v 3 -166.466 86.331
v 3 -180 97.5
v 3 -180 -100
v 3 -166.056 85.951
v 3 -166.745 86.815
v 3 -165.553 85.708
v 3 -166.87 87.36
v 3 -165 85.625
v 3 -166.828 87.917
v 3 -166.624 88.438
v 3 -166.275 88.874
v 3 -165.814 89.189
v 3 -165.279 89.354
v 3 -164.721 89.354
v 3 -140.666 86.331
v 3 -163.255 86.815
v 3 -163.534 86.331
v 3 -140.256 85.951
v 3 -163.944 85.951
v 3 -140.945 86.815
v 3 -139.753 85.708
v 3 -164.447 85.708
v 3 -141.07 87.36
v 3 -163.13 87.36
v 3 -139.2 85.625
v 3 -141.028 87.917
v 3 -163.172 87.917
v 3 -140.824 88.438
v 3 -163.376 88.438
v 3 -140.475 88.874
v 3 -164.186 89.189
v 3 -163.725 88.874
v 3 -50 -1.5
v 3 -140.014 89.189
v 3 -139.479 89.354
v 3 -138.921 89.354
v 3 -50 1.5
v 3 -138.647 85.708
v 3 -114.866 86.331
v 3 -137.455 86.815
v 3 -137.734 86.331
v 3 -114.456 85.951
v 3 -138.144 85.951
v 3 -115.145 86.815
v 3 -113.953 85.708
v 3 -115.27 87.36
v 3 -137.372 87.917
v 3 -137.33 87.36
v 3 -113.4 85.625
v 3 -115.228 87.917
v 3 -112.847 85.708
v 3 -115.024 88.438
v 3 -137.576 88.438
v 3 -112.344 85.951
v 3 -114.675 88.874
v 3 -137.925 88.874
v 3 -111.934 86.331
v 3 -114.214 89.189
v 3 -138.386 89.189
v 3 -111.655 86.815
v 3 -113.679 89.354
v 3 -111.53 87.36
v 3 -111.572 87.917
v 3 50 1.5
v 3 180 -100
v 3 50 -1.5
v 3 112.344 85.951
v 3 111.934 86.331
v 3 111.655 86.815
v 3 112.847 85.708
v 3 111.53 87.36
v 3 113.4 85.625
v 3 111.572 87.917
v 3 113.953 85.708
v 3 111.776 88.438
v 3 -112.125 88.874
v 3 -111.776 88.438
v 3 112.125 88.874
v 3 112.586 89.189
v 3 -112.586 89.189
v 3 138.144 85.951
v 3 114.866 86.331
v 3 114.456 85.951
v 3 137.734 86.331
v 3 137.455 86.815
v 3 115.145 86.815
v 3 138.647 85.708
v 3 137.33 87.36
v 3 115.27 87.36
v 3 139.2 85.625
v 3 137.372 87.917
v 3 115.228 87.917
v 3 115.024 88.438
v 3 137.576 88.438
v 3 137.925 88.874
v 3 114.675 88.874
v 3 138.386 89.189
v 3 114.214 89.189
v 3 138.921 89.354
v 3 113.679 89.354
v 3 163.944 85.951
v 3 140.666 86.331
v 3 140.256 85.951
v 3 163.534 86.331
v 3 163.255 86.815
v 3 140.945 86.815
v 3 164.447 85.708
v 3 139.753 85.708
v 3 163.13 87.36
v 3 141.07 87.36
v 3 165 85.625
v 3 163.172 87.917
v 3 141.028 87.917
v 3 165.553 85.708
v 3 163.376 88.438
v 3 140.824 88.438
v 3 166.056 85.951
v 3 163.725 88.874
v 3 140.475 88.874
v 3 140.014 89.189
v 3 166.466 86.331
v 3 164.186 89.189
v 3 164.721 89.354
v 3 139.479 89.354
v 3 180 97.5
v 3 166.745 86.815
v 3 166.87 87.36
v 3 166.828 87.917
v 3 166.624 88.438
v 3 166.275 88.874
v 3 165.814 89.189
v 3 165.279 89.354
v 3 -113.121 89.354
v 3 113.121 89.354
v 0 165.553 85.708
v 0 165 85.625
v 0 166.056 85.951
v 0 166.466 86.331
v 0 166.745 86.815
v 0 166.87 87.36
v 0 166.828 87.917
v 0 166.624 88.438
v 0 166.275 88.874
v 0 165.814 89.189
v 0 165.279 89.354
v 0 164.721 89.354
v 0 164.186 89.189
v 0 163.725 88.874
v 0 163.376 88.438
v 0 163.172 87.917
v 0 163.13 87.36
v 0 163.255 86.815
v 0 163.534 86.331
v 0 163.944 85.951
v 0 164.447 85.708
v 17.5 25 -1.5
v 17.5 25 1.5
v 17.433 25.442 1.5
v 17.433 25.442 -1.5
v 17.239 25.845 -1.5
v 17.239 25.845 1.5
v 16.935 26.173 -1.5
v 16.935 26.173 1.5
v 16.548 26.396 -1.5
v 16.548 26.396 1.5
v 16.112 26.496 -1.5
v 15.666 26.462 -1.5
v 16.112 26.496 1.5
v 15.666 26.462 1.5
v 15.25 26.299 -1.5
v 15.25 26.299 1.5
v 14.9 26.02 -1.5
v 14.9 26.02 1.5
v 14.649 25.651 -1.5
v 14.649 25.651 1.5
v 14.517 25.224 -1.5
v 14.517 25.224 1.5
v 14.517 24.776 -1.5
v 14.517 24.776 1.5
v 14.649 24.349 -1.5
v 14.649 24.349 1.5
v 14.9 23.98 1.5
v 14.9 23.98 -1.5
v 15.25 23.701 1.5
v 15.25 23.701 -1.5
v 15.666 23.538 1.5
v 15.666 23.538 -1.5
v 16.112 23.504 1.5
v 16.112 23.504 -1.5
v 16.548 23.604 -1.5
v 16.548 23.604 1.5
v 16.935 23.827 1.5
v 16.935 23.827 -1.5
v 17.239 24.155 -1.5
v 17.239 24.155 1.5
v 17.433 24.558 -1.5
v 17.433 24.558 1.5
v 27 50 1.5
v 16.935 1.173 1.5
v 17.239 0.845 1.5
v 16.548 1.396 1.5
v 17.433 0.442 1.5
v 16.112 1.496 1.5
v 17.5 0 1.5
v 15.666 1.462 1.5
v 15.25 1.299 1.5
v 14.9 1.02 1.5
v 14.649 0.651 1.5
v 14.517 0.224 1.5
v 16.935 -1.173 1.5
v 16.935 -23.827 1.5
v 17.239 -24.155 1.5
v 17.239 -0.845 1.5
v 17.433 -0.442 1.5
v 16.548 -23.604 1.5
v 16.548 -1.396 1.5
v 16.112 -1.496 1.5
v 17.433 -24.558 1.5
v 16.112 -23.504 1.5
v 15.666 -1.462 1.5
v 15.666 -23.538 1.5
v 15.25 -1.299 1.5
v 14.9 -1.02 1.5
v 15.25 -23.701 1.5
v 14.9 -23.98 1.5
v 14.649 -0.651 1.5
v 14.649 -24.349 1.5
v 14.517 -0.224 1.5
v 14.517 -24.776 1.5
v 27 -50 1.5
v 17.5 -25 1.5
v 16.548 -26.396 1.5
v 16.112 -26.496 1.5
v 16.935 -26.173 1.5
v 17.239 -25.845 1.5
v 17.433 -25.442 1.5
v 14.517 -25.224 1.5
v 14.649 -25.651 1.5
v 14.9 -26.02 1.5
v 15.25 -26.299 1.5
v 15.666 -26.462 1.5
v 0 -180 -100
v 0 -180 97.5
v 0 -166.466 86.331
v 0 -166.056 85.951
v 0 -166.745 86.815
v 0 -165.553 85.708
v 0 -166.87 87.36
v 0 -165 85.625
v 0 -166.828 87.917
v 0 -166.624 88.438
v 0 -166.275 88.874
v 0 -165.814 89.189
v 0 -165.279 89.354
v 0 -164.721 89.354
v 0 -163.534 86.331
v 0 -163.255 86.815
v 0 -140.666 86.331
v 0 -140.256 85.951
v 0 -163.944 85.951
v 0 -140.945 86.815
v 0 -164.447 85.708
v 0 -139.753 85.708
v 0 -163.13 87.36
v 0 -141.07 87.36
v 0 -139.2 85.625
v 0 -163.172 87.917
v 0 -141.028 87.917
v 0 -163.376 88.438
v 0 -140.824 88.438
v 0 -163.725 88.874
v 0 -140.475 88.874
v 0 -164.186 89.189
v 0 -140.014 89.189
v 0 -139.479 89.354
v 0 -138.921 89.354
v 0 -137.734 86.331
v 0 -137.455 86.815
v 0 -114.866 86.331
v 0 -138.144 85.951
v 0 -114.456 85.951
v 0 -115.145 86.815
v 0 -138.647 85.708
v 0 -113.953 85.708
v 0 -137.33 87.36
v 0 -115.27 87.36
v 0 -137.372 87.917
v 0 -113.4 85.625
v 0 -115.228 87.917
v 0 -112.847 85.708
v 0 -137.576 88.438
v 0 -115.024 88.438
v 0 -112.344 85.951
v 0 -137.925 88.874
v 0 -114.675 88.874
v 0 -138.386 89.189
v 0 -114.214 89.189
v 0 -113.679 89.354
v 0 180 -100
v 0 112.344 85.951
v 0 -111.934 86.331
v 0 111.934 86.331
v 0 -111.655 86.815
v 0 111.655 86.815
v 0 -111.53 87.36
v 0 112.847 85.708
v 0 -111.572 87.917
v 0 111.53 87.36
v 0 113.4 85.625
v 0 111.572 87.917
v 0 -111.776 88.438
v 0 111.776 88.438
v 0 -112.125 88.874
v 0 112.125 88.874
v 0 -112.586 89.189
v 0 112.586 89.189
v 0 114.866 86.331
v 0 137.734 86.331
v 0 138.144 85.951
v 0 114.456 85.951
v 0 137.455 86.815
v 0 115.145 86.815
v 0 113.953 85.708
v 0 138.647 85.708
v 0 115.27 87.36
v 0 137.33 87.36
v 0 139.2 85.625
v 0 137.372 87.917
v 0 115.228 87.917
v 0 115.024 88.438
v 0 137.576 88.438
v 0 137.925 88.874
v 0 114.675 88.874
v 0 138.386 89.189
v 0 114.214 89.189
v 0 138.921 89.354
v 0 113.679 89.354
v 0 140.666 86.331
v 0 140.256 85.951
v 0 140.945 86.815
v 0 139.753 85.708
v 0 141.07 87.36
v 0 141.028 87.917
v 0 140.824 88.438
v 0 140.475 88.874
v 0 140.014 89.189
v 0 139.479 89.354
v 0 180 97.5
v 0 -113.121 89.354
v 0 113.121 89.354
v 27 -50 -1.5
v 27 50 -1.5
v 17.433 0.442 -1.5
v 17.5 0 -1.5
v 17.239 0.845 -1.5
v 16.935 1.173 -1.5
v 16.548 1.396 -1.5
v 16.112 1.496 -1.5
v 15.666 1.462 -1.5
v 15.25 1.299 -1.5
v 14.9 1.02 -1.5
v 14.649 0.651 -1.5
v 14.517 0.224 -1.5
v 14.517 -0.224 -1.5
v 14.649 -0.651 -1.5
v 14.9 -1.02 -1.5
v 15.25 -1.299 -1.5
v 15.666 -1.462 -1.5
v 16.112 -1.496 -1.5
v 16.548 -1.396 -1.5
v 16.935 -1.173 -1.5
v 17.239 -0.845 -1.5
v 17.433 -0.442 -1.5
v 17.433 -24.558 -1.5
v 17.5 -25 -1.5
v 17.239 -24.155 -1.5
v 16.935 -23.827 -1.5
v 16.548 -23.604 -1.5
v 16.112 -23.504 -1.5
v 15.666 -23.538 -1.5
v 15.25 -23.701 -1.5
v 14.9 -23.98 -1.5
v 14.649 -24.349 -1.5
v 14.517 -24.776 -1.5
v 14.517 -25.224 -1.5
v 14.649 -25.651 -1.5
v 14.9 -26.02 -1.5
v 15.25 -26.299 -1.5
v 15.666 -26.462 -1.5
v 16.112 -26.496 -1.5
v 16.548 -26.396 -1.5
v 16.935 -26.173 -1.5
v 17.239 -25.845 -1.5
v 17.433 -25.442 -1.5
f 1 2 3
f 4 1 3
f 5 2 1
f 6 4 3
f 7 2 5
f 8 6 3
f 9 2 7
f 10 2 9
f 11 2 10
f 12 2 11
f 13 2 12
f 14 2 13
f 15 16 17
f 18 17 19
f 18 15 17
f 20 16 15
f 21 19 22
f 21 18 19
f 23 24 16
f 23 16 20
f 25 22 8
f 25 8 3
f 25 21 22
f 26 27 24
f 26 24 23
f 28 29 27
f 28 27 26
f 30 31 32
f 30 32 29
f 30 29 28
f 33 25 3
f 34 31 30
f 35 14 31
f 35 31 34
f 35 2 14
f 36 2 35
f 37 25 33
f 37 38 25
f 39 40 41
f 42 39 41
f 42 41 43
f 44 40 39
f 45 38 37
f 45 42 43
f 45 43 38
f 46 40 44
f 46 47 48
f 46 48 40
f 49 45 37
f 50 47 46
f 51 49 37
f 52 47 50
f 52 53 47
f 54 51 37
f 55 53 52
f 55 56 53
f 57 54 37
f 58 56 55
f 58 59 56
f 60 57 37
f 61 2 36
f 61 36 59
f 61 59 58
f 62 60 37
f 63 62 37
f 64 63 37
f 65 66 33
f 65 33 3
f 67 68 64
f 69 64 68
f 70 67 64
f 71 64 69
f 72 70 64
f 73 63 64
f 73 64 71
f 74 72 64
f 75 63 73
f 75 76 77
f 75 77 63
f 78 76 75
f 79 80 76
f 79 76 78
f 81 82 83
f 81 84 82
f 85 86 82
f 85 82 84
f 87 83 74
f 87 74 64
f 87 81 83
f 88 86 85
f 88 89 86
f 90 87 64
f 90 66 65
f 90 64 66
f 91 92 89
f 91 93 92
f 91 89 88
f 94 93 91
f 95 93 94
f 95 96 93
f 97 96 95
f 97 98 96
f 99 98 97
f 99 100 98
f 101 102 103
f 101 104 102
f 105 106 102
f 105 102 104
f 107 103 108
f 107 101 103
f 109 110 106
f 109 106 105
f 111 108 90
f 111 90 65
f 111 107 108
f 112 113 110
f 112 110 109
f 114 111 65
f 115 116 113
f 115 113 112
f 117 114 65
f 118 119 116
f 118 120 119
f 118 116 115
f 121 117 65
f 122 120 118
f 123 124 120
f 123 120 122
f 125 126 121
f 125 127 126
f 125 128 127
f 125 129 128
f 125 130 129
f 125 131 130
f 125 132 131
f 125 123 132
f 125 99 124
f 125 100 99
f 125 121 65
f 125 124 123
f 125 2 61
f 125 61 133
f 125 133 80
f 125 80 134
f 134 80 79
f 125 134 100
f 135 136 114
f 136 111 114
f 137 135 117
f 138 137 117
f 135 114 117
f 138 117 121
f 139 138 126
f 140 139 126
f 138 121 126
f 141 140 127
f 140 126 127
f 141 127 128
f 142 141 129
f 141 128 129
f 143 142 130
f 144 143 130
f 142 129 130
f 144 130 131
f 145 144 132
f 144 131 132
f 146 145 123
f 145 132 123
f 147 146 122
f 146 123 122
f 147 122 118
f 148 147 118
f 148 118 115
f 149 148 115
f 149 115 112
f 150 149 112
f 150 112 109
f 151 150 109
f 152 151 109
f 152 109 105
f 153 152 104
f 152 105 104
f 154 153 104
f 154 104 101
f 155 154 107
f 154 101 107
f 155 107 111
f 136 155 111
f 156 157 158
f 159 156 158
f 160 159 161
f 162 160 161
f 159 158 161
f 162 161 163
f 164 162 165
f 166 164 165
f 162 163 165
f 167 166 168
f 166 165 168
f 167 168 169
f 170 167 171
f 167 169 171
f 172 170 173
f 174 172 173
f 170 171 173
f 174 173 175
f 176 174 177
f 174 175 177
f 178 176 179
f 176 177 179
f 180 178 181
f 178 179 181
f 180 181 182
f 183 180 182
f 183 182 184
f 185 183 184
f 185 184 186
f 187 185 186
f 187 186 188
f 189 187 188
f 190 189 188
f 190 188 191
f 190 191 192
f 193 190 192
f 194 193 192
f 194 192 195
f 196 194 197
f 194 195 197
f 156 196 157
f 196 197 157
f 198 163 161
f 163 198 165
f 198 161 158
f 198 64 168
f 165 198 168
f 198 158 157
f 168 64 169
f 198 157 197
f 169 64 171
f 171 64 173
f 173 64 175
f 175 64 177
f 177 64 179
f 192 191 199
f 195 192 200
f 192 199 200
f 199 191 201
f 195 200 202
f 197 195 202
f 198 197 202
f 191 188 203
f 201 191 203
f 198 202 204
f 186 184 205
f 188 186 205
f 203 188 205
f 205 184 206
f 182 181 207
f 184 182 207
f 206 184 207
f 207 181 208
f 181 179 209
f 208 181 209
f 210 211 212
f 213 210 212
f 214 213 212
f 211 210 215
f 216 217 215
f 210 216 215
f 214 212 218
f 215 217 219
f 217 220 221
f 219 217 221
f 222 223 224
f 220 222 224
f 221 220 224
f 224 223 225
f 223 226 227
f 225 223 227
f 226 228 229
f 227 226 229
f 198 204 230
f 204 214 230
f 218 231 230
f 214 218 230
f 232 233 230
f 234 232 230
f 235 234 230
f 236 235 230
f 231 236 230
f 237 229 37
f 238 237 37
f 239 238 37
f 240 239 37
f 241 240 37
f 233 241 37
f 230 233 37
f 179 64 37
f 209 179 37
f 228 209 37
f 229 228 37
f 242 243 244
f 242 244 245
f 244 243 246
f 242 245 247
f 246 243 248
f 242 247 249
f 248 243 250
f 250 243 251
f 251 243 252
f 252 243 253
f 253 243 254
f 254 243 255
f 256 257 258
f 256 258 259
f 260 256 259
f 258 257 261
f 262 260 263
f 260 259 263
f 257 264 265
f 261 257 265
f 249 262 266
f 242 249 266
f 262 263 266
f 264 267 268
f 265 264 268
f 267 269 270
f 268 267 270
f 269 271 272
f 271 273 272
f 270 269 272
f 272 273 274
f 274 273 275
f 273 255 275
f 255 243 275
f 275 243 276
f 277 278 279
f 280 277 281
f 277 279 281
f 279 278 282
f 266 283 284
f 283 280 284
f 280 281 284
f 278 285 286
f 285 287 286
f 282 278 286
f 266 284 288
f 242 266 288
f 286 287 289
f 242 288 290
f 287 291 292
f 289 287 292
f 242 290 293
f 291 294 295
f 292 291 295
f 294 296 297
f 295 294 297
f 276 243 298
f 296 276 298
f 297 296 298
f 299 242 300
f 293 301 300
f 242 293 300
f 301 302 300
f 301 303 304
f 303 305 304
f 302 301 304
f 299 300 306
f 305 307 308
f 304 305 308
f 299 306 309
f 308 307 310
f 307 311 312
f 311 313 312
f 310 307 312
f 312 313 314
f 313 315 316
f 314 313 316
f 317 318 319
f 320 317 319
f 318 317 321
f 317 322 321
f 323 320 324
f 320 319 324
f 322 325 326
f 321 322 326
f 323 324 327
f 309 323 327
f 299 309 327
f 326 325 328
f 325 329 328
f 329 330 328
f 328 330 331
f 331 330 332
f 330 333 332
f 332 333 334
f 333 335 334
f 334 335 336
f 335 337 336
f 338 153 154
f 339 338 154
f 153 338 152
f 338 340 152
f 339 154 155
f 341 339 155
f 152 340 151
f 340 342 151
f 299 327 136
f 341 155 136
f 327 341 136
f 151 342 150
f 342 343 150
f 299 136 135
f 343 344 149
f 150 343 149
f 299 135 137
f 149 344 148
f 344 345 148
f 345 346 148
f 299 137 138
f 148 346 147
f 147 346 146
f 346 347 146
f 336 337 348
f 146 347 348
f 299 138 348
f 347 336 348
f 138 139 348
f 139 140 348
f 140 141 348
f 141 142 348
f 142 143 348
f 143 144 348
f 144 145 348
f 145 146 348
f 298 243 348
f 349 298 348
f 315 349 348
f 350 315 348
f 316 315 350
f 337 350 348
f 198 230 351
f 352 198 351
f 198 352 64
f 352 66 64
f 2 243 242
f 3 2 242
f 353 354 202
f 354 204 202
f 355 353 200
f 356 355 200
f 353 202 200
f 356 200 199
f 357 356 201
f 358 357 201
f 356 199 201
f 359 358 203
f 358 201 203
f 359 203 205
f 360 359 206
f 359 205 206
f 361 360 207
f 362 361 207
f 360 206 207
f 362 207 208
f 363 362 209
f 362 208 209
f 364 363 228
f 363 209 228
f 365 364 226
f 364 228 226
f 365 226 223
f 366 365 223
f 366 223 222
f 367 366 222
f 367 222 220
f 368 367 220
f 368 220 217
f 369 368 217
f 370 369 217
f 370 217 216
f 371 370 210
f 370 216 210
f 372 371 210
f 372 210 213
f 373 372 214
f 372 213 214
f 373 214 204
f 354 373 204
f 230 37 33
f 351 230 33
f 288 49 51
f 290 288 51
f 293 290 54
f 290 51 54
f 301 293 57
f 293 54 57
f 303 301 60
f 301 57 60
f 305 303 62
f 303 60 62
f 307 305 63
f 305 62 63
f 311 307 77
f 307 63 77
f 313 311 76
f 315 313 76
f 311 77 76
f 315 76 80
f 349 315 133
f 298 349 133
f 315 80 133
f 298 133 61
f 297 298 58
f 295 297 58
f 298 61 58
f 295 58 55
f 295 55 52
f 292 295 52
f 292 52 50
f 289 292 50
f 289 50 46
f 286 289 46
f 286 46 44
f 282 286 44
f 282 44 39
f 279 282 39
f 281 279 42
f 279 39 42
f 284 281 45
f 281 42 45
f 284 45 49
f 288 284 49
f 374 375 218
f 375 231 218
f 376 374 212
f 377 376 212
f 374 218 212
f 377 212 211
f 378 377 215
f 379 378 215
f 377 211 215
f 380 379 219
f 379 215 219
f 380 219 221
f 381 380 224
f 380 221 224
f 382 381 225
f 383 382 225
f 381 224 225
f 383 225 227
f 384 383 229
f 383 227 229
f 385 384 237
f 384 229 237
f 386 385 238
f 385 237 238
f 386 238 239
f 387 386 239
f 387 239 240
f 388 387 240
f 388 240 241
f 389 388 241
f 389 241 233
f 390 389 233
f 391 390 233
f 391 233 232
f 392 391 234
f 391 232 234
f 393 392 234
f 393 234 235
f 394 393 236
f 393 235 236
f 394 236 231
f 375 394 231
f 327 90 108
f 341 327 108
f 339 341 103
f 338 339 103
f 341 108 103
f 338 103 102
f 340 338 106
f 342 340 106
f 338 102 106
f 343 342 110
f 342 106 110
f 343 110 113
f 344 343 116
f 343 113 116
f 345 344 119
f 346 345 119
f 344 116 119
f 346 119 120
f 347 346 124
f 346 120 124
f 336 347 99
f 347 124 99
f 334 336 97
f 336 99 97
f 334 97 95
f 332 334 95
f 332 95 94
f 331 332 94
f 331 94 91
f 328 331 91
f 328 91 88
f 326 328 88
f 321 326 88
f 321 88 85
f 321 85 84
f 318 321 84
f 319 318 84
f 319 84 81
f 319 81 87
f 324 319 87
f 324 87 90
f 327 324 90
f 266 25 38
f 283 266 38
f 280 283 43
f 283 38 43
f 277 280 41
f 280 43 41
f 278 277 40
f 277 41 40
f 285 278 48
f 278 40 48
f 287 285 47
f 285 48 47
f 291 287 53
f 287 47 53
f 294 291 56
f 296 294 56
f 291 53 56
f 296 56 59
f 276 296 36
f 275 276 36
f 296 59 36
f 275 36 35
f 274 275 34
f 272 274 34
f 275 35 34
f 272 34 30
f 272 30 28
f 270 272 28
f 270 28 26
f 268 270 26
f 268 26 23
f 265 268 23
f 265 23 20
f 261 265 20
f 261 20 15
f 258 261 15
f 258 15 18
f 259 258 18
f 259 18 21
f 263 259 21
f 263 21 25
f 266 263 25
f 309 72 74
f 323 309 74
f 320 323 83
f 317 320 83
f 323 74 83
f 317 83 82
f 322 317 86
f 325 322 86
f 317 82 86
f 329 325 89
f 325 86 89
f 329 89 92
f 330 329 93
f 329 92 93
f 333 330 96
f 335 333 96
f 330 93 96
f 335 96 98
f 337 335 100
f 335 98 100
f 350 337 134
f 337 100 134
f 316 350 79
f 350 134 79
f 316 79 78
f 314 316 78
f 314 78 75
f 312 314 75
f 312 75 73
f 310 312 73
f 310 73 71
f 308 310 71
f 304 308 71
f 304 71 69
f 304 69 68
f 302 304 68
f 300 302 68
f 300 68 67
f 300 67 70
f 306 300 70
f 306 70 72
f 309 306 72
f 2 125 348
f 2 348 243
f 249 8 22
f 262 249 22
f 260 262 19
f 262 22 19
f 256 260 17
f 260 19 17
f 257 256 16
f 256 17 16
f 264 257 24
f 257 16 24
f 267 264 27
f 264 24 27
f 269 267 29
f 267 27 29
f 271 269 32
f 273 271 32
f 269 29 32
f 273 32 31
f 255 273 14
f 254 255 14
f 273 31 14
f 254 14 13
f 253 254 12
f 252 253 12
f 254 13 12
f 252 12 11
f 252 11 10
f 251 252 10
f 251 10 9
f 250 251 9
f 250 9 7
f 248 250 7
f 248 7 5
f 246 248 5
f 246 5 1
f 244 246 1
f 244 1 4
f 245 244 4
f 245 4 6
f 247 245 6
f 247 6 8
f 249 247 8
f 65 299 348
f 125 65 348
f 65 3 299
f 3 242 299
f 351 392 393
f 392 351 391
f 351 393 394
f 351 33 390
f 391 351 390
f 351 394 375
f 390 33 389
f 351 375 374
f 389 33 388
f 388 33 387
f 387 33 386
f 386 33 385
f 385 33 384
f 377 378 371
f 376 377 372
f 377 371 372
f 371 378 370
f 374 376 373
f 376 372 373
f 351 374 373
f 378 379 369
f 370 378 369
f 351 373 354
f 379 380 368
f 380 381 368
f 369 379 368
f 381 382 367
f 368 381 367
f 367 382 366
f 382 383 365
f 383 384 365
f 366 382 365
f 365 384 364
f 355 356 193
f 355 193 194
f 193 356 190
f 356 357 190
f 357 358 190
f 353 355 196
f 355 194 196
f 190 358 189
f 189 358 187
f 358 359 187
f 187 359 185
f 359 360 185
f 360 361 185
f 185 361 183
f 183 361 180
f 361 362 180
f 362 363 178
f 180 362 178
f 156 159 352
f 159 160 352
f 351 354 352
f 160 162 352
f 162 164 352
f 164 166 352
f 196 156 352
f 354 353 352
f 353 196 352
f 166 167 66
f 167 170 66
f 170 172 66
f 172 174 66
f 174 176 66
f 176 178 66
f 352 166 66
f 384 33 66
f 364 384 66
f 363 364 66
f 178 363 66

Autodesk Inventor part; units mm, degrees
ref_plane "YZ Plane" through (0, 0, 0) normal (1, 0, 0) x (0, 1, 0)
ref_plane "XZ Plane" through (0, 0, 0) normal (0, 1, 0) x (-1, 0, 0)
ref_plane "XY Plane" through (0, 0, 0) normal (0, 0, 1) x (1, 0, 0)
sketch "Sketch1" plane through (0, 0, 0) normal (1, 0, 0) x (0, 1, 0)
  line L0 (180, 100) -> (-180, 100)
  line L1 (-180, 100) -> (-180, -100)
  line L2 (-180, -100) -> (180, -100)
  line L3 (180, -100) -> (180, 100)
  line L4 (180, 100) -> (-180, -100) construction
  line L5 (-180, 100) -> (180, -100) construction
  point P0 (0, 0)
  dimension "d0" = 360
  dimension "d1" = 200
extrude "Extrusion1" add sketch "Sketch1" along normal blind 3
sketch "Sketch7" plane through (3, 0, 0) normal (1, 0, 0) x (0, 0, -1)
  line L0 (1.5, 50) -> (-1.5, 50)
  line L1 (-1.5, 50) -> (-1.5, -50)
  line L2 (-1.5, -50) -> (1.5, -50)
  line L3 (1.5, -50) -> (1.5, 50)
  line L4 (1.5, 50) -> (-1.5, -50) construction
  line L5 (-1.5, 50) -> (1.5, -50) construction
  point P0 (0, 0)
  dimension "d69" = 3
  dimension "d70" = 100
extrude "Extrusion10" add sketch "Sketch7" along normal blind 24
sketch "Sketch8" plane through (3, -50, 1.5) normal (0, 0, 1) x (1, 0, 0)
  circle A0 centre (13, 75) radius 1.5
  circle A1 centre (13, 50) radius 1.5
  circle A2 centre (13, 25) radius 1.5
  line L0 (0, 100) -> (24, 100) projected
  line L1 (0, 0) -> (24, 0) projected
  line L2 (24, 100) -> (24, 0) projected
  line L3 (0, 230) -> (0, -130) projected
  point P0 (-3, 50)
  dimension "d73" = 3
  dimension "d74" = 3
  dimension "d75" = 3
  dimension "d76" = 25
  dimension "d77" = 25
  dimension "d78" = 25
  dimension "d87" = 25
  dimension "d88" = 11
  dimension "d89" = 11
  dimension "d90" = 11
extrude "Extrusion11" cut sketch "Sketch8" against normal blind 25 contours A0 | A1 | A2
sketch "Sketch9" plane through (3, 0, 0) normal (1, 0, 0) x (0, 0, -1)
  circle A0 centre (-87.5, 165) radius 1.875
  circle A1 centre (-87.5, 139.2) radius 1.875
  circle A2 centre (-87.5, 113.4) radius 1.875
  line L0 (100, 180) -> (-100, 180) projected
  line L1 (-100, 180) -> (-100, -180) projected
  point P0 (0, 0)
  dimension "d91" = 3.75
  dimension "d92" = 3.75
  dimension "d93" = 3.75
  dimension "d96" = 15
  dimension "d97" = 25.8
  dimension "d98" = 25.8
  dimension "d99" = 12.5
extrude "Extrusion12" cut sketch "Sketch9" against normal blind 10
mirror "Mirror2" about plane through (0, 0, 0) normal (0, 1, 0) of "Extrusion12"
sketch "Sketch10" plane through (3, 0, 0) normal (1, 0, 0) x (0, 0, -1)
  line L0 (100, 180) -> (-100, 180) projected
  line L1 (-100, 180) -> (-97.5, 180)
  line L2 (-97.5, 180) -> (-97.5, -180)
  line L3 (-100, -180) -> (100, -180) projected
  line L4 (-97.5, -180) -> (-100, -180)
  line L5 (-100, -180) -> (-100, 180)
  point P0 (0, 0)
  dimension "d102" = 2.5
  dimension "d103" = 90
extrude "Extrusion13" cut sketch "Sketch10" against normal blind 10
properties part number "leftside"
